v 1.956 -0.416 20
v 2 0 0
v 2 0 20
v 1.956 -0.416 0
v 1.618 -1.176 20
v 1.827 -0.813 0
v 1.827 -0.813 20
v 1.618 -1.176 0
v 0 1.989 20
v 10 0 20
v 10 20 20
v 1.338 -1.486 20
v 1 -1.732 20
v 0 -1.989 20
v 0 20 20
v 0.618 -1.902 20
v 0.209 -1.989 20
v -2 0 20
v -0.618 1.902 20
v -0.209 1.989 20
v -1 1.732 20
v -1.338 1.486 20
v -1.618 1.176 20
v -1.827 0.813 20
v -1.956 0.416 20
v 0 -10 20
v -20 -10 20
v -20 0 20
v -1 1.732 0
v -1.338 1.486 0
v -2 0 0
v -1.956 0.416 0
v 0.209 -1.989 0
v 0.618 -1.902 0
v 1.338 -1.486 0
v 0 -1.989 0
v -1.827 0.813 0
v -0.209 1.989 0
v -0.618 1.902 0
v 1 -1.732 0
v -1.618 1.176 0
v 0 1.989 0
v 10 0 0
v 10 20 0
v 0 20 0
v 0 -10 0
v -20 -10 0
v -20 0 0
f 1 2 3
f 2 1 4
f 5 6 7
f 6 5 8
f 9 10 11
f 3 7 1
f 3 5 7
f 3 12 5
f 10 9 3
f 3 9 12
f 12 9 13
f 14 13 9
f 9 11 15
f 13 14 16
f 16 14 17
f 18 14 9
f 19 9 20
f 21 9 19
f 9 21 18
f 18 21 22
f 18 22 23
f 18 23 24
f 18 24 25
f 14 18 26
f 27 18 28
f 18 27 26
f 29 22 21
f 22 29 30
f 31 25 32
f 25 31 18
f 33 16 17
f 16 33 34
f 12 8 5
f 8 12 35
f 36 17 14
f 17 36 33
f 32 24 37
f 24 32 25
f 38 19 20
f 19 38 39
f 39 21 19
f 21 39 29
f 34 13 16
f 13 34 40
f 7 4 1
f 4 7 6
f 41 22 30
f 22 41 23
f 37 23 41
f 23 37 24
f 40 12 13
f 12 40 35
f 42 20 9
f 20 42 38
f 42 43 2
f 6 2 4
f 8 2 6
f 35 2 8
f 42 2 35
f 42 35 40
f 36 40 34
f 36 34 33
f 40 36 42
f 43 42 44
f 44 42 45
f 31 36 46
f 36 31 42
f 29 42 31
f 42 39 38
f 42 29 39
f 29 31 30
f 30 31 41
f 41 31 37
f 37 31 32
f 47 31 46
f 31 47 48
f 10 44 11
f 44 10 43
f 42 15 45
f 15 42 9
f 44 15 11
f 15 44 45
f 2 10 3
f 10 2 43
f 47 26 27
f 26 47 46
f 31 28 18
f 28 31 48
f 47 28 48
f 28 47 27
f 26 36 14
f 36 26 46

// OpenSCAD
cylinder(r=2, h=20, $fn=30);
cube([10, 20, 20]);
mirror([1,1,0]) cube([10, 20, 20]);
